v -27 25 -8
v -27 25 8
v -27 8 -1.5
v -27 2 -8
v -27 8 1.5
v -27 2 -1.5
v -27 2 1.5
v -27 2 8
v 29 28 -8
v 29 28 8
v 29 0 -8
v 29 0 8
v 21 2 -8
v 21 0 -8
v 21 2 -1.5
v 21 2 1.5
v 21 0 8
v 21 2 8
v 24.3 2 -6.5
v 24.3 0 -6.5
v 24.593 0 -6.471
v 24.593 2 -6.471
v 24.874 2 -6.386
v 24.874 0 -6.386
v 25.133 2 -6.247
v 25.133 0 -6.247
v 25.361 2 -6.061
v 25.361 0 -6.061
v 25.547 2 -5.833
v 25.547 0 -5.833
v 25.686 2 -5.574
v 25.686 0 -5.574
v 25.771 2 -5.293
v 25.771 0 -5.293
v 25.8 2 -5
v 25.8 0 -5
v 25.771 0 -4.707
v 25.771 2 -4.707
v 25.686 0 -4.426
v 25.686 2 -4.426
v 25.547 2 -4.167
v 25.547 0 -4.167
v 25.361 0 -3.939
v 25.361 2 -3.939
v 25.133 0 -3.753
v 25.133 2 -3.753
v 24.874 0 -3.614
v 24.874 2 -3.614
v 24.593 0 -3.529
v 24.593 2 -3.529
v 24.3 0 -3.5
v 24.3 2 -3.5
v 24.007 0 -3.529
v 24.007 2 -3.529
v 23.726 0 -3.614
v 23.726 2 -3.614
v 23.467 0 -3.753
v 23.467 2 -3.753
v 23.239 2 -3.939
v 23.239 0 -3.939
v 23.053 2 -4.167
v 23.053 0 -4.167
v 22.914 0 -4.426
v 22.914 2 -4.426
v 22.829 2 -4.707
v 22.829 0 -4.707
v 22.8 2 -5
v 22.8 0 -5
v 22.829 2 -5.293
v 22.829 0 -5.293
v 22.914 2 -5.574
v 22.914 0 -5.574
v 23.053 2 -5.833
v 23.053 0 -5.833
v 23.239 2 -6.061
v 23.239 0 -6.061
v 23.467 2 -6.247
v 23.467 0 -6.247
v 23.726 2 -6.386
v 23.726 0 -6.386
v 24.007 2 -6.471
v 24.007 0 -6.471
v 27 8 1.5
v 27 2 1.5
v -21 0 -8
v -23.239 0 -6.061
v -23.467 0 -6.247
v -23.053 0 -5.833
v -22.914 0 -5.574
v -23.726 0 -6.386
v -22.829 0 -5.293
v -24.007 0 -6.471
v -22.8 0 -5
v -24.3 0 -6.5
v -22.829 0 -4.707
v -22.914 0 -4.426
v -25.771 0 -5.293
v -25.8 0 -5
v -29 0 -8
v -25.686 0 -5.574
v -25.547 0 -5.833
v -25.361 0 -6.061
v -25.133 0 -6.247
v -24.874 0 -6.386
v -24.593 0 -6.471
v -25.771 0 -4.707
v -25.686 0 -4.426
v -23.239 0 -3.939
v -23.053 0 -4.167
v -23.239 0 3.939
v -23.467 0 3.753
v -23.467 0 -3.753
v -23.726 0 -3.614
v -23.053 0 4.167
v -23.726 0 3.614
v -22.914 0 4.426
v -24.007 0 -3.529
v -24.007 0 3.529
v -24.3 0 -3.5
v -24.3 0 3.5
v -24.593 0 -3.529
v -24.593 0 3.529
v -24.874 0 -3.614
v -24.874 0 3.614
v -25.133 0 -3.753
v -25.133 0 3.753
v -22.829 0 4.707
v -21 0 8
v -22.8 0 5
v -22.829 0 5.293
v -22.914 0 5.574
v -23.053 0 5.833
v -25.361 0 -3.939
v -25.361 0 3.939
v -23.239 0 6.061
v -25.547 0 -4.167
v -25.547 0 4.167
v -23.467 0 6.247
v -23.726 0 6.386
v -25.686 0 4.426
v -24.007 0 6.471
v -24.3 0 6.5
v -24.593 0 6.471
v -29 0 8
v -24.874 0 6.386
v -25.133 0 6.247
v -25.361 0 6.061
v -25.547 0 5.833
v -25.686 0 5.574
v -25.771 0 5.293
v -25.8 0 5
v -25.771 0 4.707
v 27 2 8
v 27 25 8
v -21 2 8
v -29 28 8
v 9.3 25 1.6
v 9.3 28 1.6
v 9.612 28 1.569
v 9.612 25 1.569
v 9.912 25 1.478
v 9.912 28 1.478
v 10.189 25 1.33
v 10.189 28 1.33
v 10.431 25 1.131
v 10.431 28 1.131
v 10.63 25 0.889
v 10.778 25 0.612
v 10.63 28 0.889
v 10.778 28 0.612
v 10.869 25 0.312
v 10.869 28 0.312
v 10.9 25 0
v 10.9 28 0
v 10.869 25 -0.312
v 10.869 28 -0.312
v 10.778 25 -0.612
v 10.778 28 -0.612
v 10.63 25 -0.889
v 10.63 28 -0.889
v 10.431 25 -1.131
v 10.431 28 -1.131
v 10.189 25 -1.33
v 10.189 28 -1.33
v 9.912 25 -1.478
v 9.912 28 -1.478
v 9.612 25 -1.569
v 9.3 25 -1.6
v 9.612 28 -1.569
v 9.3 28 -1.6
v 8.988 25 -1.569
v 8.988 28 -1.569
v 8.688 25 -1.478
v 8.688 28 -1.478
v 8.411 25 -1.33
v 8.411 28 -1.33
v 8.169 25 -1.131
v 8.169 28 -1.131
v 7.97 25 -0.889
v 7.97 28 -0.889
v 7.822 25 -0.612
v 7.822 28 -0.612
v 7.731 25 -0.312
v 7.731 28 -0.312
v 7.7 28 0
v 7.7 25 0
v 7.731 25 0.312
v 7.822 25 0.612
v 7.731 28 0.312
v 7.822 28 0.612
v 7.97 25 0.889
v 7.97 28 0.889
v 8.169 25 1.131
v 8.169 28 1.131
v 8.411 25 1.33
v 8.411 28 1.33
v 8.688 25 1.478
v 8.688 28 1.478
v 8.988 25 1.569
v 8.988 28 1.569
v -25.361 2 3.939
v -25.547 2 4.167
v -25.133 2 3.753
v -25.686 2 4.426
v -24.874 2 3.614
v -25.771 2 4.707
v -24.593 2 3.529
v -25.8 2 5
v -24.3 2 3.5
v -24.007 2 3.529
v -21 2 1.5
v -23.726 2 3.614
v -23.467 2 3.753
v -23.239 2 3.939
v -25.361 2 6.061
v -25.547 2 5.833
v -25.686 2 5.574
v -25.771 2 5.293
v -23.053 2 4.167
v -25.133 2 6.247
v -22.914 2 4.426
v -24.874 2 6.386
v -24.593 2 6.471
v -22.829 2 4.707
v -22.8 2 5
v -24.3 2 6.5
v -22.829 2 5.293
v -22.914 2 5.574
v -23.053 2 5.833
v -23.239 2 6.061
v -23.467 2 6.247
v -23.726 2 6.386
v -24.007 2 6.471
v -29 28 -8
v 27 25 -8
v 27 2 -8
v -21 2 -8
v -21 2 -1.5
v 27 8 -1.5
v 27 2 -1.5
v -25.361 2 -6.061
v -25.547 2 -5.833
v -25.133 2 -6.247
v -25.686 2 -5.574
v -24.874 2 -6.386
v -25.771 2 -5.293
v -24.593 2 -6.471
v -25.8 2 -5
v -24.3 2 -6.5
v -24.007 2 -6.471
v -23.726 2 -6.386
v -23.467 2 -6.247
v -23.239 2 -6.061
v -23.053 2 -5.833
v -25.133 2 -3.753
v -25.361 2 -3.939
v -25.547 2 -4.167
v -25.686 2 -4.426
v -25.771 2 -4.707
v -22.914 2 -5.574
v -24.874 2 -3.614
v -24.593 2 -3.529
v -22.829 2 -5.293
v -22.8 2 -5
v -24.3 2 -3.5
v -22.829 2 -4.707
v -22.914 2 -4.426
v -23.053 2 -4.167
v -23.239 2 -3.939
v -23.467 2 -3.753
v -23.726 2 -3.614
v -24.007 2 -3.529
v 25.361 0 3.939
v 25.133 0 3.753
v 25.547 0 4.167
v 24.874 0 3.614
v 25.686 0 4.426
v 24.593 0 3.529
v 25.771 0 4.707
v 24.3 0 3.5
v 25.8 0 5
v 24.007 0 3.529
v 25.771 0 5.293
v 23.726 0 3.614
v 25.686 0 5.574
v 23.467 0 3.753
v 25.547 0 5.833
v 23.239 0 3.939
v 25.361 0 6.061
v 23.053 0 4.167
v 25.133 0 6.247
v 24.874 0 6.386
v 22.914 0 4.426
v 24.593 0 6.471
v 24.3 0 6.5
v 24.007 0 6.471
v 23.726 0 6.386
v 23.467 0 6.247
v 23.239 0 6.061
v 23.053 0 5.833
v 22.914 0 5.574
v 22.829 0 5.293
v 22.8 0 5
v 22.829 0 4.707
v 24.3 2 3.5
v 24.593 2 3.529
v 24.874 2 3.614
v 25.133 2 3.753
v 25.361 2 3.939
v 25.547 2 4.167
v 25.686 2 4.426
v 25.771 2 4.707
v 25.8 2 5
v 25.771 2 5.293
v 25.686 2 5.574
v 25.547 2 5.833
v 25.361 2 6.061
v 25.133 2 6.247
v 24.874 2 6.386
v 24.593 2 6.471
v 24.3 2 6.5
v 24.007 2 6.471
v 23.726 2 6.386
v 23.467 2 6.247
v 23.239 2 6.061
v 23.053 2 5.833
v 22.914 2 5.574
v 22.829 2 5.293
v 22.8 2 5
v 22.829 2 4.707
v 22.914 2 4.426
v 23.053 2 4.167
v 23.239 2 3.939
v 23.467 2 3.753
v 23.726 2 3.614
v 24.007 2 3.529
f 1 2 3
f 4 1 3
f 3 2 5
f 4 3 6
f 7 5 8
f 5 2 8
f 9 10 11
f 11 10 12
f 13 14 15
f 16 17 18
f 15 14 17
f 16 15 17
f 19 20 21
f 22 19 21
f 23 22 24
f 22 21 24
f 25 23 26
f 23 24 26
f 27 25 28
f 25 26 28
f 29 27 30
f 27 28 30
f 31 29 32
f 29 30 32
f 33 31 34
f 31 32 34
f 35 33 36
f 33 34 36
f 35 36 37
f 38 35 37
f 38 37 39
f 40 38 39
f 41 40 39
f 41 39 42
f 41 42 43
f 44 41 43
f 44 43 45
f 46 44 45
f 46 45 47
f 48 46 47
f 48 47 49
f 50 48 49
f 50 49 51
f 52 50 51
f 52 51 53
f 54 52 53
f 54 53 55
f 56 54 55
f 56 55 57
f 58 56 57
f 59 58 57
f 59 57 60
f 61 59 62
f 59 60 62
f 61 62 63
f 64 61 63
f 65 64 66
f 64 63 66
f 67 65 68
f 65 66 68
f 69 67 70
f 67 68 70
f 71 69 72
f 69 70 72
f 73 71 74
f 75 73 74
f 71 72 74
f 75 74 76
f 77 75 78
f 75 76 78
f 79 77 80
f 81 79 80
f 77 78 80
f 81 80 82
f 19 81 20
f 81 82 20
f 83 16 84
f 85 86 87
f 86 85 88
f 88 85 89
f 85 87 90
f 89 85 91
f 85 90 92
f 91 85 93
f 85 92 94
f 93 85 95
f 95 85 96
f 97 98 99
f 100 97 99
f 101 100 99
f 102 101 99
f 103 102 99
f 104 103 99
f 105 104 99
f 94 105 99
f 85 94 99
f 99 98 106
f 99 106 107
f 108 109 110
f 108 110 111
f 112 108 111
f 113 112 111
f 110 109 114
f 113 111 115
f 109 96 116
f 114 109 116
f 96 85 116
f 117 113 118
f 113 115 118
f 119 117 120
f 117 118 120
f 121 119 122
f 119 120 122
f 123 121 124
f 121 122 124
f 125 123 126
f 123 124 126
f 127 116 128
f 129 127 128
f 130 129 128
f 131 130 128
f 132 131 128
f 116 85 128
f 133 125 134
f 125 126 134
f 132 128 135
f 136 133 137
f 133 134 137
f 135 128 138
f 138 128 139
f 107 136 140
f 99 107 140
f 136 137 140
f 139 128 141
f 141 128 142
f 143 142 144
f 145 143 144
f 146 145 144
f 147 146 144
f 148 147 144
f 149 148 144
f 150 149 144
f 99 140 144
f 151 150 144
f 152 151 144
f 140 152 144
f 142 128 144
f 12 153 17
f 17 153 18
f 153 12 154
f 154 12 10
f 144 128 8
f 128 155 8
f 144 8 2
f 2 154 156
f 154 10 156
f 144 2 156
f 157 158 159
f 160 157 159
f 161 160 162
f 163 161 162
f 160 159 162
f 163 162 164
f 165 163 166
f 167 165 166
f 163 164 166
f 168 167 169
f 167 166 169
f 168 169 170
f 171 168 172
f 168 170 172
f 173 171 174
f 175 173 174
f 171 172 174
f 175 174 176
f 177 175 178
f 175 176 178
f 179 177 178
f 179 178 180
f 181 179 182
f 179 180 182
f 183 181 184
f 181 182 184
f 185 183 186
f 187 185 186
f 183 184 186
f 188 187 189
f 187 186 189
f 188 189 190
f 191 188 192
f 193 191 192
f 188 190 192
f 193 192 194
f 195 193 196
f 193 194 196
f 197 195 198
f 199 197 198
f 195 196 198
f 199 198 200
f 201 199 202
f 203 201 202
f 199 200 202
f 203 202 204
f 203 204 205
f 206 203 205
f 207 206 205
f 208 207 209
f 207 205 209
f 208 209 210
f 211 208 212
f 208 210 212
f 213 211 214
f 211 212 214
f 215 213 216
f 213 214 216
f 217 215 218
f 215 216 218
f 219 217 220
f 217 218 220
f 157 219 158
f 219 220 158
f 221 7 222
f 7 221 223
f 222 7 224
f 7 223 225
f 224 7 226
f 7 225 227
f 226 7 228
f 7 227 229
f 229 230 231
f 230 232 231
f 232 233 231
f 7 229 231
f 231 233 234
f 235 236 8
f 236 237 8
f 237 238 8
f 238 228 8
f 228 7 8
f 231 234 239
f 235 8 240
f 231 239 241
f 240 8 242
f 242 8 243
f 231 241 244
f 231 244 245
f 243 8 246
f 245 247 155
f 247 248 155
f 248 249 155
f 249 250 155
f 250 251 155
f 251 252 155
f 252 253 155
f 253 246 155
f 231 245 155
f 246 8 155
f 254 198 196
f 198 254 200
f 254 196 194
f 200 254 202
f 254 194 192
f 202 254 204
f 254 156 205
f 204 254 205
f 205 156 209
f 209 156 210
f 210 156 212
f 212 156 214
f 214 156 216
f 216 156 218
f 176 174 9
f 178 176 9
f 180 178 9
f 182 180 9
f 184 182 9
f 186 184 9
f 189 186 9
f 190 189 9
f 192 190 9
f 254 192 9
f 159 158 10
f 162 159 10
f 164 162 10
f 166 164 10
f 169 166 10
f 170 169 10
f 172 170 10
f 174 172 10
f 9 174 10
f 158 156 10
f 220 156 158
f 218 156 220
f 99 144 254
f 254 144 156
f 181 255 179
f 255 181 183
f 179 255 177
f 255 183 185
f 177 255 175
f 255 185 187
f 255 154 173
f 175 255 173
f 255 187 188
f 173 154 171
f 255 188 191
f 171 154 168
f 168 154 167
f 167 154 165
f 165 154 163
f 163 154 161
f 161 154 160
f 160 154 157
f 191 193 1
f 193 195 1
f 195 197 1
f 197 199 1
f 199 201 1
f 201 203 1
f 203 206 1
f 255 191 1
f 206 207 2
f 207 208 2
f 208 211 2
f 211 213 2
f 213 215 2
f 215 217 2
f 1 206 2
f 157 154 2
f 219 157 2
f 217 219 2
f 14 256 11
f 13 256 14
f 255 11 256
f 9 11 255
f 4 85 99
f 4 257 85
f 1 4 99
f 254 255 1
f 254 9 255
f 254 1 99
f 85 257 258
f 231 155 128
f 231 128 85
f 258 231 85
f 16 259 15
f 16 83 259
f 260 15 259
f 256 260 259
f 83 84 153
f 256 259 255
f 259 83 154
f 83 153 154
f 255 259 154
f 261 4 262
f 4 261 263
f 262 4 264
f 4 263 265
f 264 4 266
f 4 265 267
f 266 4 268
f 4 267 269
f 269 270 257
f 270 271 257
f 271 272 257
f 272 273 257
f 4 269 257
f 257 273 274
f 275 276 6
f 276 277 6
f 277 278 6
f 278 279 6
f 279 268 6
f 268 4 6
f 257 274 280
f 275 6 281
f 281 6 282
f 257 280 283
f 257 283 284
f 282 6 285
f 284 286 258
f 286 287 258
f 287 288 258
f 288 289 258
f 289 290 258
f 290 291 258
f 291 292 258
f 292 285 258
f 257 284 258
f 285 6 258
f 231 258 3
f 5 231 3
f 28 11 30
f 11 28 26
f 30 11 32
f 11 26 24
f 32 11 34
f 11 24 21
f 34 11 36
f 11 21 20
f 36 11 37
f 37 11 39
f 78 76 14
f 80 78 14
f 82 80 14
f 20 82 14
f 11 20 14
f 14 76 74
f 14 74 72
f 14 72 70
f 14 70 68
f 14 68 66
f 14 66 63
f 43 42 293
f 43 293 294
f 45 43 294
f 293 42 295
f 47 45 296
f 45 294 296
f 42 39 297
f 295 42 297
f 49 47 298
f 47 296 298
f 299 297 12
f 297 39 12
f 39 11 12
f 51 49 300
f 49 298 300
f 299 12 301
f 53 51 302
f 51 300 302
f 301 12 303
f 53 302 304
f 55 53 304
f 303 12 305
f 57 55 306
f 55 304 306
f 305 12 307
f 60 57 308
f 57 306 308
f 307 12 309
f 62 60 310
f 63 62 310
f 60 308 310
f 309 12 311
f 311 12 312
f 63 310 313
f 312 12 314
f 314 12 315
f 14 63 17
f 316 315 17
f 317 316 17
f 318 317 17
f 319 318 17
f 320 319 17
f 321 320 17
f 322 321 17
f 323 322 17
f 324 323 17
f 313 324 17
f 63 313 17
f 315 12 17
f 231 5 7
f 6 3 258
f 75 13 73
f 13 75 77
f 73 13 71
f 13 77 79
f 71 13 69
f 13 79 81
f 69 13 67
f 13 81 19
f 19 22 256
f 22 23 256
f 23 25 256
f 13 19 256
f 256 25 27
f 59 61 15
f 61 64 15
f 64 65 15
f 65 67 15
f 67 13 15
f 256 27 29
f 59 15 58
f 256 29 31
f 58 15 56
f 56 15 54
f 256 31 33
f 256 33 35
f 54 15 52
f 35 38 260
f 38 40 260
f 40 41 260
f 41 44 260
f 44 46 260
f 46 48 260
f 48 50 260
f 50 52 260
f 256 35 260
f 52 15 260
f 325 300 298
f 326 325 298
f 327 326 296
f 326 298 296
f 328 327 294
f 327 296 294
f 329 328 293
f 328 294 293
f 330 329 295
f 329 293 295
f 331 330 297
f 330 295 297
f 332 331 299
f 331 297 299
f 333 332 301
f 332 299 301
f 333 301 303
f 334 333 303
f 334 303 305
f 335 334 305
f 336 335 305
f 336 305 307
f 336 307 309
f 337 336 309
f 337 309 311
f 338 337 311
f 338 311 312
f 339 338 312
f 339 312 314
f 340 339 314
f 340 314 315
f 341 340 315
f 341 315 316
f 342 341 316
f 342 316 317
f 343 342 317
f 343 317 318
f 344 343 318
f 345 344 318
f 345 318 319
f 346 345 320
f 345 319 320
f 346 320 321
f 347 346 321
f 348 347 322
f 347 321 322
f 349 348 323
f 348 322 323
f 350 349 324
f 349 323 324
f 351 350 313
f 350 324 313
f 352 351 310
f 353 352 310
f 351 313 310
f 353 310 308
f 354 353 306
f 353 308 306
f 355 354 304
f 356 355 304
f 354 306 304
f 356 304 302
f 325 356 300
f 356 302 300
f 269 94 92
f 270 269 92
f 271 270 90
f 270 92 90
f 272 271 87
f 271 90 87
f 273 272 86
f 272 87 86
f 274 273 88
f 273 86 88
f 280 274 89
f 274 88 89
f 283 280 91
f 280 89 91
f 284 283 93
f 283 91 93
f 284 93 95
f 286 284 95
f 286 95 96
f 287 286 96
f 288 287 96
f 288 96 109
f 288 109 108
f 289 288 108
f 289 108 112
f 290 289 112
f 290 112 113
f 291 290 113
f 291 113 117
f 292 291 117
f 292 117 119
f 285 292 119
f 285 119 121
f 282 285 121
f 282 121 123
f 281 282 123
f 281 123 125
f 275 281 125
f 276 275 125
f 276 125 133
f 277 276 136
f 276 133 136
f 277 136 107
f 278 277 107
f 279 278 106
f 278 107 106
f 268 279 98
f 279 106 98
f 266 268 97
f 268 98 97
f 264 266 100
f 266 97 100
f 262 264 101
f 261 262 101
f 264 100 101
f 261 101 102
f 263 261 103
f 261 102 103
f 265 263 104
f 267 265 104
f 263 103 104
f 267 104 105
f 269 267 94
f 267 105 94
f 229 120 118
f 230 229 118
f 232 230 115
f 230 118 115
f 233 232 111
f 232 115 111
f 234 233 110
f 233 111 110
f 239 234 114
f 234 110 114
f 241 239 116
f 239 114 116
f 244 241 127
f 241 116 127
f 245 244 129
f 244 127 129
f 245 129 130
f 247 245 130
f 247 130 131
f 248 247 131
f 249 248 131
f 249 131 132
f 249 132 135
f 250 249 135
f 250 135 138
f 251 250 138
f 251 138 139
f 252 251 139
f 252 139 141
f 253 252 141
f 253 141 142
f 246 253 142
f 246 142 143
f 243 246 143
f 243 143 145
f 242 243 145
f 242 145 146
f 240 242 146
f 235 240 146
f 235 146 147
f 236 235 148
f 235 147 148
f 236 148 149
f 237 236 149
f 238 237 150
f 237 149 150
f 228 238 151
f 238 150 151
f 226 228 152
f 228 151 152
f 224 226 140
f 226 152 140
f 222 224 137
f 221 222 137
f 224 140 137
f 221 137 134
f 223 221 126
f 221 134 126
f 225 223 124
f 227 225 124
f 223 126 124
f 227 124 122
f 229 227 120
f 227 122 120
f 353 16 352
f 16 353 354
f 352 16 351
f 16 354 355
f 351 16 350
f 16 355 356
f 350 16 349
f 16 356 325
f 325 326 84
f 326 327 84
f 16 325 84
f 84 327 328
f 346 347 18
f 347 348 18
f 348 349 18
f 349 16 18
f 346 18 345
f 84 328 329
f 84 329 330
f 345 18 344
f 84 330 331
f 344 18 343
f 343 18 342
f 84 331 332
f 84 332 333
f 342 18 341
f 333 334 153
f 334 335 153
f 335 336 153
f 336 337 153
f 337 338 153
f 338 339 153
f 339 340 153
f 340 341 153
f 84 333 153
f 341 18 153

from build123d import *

# Parameters (mm, degrees)
RESSALTO_EXTRUS_O1_DEPTH = 8
ESBO_O2_R                = 1.5
CORTE_EXTRUS_O1_DEPTH    = 16
RESSALTO_EXTRUS_O3_DEPTH = 1.5
ESBO_O6_R                = 1.6
CORTE_EXTRUS_O2_DEPTH    = 3


with BuildPart() as part:
    # Esboço1 → Ressalto-extrusão1 (new, symmetric)
    with BuildSketch(Plane.XY):
        Polygon((-21, 0), (-29, 0), (-29, 28), (29, 28), (29, 0), (21, 0), (21, 2), (27, 2), (27, 25), (-27, 25), (-27, 2), (-21, 2), align=None)
    extrude(amount=RESSALTO_EXTRUS_O1_DEPTH, both=True)

    # Esboço2 → Corte-extrusão1 (cut)
    with BuildSketch(Plane.XZ):
        with Locations(Location((-24.3, -5, 0), (0, 0, 270))):
            Circle(ESBO_O2_R)
        with Locations(Location((-24.3, 5, 0), (0, 0, 270))):
            Circle(ESBO_O2_R)
        with Locations(Location((24.3, 5, 0), (0, 0, 270))):
            Circle(ESBO_O2_R)
        with Locations(Location((24.3, -5, 0), (0, 0, 270))):
            Circle(ESBO_O2_R)
    extrude(amount=-CORTE_EXTRUS_O1_DEPTH, mode=Mode.SUBTRACT)

    # Esboço4 → Ressalto-extrusão3 (add, symmetric)
    with BuildSketch(Plane.XY):
        Polygon((-21, 2), (-27, 8), (-27, 2), align=None)
        Polygon((21, 2), (27, 2), (27, 8), align=None)
    extrude(amount=RESSALTO_EXTRUS_O3_DEPTH, both=True)

    # Esboço6 → Corte-extrusão2 (cut)
    with BuildSketch(Plane(origin=(0, 28, 0), x_dir=(1, 0, 0), z_dir=(0, 1, 0))):
        with Locations(Location((9.3, 0, 0), (0, 0, 270))):
            Circle(ESBO_O6_R)
    extrude(amount=-CORTE_EXTRUS_O2_DEPTH, mode=Mode.SUBTRACT)


solid = part.part
